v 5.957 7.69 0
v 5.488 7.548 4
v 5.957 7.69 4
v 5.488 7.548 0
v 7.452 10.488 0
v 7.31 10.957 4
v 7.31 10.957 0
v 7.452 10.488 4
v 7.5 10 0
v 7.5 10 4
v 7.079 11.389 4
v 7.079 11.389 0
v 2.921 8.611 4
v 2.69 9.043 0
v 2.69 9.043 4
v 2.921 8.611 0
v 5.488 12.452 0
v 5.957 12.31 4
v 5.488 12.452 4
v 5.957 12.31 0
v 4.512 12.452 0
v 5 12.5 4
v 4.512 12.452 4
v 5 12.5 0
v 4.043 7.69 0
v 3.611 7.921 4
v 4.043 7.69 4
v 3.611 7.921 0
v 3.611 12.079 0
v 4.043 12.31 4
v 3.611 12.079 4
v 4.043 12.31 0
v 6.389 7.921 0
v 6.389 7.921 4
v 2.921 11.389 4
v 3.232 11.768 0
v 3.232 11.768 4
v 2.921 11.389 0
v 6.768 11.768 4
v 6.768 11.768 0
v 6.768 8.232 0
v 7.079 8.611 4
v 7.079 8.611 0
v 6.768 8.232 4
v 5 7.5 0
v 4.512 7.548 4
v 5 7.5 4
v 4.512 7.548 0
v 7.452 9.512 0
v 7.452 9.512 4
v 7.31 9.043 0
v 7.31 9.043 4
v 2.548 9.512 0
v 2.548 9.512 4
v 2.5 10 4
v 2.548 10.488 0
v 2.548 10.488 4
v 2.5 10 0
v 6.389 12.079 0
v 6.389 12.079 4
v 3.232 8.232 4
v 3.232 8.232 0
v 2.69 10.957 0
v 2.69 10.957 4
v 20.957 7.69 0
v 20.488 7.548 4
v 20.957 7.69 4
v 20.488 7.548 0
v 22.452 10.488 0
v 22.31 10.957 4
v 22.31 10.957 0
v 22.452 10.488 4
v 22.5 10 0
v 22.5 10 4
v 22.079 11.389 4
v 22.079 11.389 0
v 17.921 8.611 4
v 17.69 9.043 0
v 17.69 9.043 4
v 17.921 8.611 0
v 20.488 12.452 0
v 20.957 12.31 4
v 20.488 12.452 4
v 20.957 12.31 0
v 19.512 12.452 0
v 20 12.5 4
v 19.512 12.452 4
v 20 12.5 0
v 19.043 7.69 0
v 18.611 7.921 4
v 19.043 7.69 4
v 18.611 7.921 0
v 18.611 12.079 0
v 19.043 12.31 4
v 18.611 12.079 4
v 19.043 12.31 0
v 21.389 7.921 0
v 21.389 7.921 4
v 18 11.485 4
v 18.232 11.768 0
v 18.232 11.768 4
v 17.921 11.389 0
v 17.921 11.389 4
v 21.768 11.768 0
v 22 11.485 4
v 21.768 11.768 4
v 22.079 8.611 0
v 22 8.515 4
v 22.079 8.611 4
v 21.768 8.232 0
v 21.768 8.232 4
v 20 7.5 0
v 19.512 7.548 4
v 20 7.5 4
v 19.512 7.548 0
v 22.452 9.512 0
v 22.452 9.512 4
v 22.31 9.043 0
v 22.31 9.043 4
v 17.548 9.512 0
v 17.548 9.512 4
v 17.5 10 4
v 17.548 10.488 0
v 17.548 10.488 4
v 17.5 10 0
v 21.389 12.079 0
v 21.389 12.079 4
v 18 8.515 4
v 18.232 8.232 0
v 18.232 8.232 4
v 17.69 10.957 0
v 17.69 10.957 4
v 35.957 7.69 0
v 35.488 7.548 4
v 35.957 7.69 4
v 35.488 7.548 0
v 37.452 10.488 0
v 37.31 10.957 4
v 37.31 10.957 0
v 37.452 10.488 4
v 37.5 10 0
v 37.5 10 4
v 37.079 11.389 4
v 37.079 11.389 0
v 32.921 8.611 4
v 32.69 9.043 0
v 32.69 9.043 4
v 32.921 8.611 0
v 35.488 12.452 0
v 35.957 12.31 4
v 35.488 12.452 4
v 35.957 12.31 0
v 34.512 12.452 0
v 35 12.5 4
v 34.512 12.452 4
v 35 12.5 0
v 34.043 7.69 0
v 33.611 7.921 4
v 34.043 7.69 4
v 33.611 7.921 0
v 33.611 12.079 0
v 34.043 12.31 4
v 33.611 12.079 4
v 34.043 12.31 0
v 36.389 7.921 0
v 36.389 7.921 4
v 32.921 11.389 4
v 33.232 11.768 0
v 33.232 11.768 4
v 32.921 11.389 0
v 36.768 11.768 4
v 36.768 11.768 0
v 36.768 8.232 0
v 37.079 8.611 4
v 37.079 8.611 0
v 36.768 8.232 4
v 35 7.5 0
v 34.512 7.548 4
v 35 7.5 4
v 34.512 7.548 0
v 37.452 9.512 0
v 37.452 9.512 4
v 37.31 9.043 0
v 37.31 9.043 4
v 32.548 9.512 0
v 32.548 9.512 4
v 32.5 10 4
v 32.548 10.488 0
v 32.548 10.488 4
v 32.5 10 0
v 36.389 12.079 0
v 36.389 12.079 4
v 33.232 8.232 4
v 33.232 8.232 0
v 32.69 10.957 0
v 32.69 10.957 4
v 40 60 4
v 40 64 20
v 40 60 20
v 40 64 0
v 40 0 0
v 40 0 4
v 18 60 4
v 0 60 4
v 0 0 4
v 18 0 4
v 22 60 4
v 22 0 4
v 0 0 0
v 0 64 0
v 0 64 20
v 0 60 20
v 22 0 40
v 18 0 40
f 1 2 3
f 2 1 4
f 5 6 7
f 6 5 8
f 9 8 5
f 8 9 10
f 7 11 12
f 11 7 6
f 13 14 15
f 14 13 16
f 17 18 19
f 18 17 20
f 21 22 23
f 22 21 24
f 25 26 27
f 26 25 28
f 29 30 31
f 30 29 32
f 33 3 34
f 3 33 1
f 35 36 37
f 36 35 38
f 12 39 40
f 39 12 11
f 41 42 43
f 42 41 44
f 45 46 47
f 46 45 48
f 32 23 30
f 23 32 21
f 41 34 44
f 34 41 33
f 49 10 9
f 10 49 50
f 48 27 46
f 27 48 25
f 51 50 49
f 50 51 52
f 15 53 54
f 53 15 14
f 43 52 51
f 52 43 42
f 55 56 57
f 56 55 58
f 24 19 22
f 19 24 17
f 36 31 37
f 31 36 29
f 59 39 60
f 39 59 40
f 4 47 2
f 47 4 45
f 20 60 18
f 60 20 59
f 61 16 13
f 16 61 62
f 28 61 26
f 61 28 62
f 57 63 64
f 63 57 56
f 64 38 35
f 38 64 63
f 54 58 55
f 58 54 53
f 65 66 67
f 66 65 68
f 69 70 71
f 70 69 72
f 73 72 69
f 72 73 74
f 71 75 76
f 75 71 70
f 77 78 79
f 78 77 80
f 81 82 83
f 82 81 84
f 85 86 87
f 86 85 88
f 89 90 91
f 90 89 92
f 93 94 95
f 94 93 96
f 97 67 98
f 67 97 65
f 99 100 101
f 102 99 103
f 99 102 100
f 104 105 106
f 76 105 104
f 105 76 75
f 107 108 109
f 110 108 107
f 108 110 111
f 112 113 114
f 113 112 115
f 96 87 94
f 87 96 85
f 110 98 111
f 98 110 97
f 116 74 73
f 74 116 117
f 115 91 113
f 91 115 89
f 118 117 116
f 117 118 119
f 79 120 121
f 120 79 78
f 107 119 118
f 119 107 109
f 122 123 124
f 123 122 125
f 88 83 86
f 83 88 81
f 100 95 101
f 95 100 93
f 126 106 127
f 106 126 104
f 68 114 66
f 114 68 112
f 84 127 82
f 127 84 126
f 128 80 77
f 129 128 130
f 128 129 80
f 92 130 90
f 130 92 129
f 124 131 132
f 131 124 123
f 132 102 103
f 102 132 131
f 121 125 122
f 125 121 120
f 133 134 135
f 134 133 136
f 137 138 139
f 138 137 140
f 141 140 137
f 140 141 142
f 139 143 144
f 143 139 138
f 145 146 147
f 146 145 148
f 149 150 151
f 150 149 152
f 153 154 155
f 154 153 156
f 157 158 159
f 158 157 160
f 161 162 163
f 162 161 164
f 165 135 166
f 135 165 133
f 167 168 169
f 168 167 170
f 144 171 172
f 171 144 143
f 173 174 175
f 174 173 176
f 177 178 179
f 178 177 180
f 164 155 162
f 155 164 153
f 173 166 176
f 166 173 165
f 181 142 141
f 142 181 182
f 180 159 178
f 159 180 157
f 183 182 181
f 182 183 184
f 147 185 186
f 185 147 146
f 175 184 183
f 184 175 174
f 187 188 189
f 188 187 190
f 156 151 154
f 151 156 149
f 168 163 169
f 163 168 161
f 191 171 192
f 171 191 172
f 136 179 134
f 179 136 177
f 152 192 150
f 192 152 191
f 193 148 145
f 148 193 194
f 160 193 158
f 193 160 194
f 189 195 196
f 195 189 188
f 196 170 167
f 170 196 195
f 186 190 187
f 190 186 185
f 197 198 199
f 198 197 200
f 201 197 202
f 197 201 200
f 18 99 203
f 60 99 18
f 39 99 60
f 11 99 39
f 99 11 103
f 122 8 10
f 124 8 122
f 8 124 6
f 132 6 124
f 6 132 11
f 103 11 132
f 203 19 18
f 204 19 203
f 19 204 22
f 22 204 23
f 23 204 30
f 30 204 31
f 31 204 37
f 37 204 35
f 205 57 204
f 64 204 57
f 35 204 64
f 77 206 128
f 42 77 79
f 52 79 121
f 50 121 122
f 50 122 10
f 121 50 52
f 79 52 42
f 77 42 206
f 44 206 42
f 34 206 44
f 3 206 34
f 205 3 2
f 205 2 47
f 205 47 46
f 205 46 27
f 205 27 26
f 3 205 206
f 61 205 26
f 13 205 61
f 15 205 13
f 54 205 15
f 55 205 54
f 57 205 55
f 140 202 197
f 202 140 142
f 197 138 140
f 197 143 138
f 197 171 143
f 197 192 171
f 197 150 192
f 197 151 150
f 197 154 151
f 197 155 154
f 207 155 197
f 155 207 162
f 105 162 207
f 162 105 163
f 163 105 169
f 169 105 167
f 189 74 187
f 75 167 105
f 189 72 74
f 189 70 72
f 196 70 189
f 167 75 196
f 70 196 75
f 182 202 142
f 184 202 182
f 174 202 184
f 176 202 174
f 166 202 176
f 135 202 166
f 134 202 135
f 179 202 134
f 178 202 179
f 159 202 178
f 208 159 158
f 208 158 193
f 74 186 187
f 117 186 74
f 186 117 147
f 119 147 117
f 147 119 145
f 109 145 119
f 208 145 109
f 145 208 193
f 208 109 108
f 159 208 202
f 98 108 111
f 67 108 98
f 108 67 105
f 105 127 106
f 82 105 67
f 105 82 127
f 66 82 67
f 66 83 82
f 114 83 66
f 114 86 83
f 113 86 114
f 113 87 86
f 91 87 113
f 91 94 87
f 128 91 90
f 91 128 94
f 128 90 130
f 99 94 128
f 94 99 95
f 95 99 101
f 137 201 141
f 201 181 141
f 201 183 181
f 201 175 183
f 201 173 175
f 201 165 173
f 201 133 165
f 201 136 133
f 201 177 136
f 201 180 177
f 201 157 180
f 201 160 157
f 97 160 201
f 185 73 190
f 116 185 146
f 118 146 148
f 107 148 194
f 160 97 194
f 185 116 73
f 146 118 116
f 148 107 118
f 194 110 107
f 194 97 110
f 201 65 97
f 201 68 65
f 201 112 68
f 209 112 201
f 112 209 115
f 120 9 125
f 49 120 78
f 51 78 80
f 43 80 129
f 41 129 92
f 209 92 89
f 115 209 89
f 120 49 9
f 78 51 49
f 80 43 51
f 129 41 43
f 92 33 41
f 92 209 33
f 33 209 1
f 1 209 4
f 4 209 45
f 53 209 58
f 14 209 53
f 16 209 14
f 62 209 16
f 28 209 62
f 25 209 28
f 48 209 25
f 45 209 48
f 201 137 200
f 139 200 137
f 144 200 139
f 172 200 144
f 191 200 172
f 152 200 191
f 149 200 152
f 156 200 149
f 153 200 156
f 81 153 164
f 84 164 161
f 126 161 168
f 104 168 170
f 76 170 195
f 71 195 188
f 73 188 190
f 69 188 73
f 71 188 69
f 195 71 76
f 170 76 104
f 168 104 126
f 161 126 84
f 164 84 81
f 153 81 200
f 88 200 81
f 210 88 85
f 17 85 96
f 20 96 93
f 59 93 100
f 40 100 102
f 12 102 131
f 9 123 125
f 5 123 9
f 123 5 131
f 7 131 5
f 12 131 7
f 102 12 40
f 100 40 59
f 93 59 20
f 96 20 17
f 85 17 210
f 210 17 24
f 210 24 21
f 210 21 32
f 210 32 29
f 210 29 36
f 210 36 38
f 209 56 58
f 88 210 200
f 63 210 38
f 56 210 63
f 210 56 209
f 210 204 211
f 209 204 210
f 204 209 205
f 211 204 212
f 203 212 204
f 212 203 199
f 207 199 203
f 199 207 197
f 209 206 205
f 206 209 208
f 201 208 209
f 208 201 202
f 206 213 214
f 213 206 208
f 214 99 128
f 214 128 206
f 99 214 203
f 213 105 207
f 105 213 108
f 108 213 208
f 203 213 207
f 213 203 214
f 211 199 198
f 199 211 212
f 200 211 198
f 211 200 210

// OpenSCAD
// Original CanvasNet test fixture: a parametric shelf bracket that combines most language features.
plate_w = 40;
plate_t = 4;
arm_len = 60;
hole_d = 5;
hole_count = 3;
$fn = 32;

function rib_height(len, ratio = 0.6) = len * ratio;
function hole_pitch(width, count) = count > 1 ? (width - 10) / (count - 1) : 0;
function hole_positions(width, count) =
  [for (i = [0 : count - 1]) [5 + i * hole_pitch(width, count), 0]];

module bracket_plate(w = plate_w, t = plate_t, l = arm_len) {
  difference() {
    cube([w, l, t]);
    mounting_holes(w, t);
  }
}

module bracket_rib(len = arm_len, t = plate_t) {
  h = rib_height(len);
  translate([plate_w / 2 - t / 2, 0, t])
    rotate([90, 0, 90])
      linear_extrude(height = t)
        polygon([[0, 0], [len, 0], [0, h]]);
}

module mounting_holes(w, t) {
  assert(hole_count >= 1, "need at least one hole");
  for (p = hole_positions(w, hole_count))
    translate([p[0], 10, -1]) cylinder(d = hole_d, h = t + 2);
}

module shelf_bracket() {
  union() {
    bracket_plate();
    bracket_rib();
    #translate([0, arm_len, 0]) cube([plate_w, plate_t, 20]);
  }
}

shelf_bracket();
